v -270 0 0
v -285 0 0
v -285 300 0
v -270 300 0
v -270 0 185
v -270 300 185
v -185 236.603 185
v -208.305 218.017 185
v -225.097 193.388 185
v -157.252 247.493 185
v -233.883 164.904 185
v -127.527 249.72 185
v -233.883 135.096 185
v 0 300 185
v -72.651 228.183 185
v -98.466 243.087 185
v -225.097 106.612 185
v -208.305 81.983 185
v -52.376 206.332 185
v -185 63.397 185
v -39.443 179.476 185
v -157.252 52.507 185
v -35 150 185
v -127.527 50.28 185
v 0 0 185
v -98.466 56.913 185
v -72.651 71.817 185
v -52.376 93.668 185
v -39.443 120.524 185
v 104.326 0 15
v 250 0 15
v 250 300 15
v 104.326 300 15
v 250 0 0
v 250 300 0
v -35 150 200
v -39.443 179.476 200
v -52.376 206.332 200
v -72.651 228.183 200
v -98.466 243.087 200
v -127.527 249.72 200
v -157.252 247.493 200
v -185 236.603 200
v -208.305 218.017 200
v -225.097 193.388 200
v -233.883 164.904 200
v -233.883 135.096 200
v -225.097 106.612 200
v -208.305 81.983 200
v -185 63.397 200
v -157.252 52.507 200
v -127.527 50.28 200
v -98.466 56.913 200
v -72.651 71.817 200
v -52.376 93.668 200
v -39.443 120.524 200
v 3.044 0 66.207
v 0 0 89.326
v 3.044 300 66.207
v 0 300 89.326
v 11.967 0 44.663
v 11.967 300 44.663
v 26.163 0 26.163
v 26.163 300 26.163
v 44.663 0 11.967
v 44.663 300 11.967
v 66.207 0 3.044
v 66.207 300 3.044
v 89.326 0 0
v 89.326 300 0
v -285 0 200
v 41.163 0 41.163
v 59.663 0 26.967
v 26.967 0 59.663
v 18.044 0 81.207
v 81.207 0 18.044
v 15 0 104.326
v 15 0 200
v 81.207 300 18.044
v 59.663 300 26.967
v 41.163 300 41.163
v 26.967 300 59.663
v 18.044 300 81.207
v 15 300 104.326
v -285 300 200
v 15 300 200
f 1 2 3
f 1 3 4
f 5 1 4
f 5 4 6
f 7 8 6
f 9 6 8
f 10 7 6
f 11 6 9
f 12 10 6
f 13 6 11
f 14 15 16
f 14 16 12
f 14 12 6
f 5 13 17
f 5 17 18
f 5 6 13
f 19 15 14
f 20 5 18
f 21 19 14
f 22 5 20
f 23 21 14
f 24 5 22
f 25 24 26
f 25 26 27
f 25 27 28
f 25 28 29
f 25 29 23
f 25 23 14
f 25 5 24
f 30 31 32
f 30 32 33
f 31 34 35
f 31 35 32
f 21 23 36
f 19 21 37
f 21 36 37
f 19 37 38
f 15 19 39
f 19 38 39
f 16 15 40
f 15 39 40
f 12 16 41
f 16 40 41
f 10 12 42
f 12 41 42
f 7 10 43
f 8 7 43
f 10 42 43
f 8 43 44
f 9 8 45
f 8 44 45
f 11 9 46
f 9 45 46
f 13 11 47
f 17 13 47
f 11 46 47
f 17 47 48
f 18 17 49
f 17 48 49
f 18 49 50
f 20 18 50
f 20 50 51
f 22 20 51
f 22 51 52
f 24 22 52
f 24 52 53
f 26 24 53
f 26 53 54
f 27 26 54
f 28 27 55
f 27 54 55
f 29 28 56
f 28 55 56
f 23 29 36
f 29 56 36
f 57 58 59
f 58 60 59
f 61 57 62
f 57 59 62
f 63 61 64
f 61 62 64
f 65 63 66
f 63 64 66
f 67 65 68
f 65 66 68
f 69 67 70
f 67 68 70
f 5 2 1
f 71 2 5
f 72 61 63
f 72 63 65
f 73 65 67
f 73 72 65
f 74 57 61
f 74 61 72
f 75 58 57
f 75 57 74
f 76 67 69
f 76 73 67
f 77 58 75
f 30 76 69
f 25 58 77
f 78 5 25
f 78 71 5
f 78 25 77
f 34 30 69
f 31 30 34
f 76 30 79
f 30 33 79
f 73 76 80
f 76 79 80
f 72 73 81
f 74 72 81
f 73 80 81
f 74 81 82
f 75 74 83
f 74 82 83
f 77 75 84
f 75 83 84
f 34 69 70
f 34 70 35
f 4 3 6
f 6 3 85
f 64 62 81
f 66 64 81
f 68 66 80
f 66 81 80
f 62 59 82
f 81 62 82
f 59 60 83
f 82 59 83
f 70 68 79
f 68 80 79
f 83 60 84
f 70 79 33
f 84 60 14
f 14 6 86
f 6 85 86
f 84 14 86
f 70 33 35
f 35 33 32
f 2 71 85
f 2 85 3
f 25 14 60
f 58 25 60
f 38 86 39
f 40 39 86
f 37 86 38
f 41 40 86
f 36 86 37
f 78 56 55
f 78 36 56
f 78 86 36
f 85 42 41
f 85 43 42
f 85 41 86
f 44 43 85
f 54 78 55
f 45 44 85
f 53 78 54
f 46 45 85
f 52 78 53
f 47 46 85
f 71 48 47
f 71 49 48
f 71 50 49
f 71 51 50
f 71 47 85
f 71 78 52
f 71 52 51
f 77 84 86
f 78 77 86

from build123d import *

# Parameters (mm, degrees)
F0_W     = 270
F0_H     = 15
F0_W_2   = 235
F0_W_3   = 15
F0_H_2   = 185
F0_H_3   = 170
F1_DEPTH = 300
F2_R     = 100
F3_DEPTH = 15
F4_R     = 89.325902


with BuildPart() as f1:
    # F0 (on Front) → F1 (new body)
    with BuildSketch(Plane.XZ):
        with Locations((-135, 192.5)):
            Rectangle(F0_W, F0_H)
        with Locations((132.5, 7.5)):
            Rectangle(F0_W_2, F0_H)
        with Locations((-277.5, 92.5)):
            Rectangle(F0_W_3, F0_H_2)
        with Locations((7.5, 7.5)):
            Rectangle(F0_W_3, F0_H)
        with Locations((7.5, 100)):
            Rectangle(F0_W_3, F0_H_3)
        with Locations((7.5, 192.5)):
            Rectangle(F0_W_3, F0_H)
        with Locations((-277.5, 192.5)):
            Rectangle(F0_W_3, F0_H)
    extrude(amount=-F1_DEPTH)

    # F2 (on face) → F3 (cut, through all)
    with BuildSketch(Plane.XY.offset(200)):
        with Locations((-135, 150)):
            Circle(F2_R)
    extrude(amount=-F3_DEPTH, mode=Mode.SUBTRACT)

    # F4
    f4_edges = [f1.edges().sort_by_distance(p)[0] for p in [
        (15, 150, 15),
        (0, 150, 0),
    ]]
    fillet(f4_edges, radius=F4_R)


solid = f1.part
